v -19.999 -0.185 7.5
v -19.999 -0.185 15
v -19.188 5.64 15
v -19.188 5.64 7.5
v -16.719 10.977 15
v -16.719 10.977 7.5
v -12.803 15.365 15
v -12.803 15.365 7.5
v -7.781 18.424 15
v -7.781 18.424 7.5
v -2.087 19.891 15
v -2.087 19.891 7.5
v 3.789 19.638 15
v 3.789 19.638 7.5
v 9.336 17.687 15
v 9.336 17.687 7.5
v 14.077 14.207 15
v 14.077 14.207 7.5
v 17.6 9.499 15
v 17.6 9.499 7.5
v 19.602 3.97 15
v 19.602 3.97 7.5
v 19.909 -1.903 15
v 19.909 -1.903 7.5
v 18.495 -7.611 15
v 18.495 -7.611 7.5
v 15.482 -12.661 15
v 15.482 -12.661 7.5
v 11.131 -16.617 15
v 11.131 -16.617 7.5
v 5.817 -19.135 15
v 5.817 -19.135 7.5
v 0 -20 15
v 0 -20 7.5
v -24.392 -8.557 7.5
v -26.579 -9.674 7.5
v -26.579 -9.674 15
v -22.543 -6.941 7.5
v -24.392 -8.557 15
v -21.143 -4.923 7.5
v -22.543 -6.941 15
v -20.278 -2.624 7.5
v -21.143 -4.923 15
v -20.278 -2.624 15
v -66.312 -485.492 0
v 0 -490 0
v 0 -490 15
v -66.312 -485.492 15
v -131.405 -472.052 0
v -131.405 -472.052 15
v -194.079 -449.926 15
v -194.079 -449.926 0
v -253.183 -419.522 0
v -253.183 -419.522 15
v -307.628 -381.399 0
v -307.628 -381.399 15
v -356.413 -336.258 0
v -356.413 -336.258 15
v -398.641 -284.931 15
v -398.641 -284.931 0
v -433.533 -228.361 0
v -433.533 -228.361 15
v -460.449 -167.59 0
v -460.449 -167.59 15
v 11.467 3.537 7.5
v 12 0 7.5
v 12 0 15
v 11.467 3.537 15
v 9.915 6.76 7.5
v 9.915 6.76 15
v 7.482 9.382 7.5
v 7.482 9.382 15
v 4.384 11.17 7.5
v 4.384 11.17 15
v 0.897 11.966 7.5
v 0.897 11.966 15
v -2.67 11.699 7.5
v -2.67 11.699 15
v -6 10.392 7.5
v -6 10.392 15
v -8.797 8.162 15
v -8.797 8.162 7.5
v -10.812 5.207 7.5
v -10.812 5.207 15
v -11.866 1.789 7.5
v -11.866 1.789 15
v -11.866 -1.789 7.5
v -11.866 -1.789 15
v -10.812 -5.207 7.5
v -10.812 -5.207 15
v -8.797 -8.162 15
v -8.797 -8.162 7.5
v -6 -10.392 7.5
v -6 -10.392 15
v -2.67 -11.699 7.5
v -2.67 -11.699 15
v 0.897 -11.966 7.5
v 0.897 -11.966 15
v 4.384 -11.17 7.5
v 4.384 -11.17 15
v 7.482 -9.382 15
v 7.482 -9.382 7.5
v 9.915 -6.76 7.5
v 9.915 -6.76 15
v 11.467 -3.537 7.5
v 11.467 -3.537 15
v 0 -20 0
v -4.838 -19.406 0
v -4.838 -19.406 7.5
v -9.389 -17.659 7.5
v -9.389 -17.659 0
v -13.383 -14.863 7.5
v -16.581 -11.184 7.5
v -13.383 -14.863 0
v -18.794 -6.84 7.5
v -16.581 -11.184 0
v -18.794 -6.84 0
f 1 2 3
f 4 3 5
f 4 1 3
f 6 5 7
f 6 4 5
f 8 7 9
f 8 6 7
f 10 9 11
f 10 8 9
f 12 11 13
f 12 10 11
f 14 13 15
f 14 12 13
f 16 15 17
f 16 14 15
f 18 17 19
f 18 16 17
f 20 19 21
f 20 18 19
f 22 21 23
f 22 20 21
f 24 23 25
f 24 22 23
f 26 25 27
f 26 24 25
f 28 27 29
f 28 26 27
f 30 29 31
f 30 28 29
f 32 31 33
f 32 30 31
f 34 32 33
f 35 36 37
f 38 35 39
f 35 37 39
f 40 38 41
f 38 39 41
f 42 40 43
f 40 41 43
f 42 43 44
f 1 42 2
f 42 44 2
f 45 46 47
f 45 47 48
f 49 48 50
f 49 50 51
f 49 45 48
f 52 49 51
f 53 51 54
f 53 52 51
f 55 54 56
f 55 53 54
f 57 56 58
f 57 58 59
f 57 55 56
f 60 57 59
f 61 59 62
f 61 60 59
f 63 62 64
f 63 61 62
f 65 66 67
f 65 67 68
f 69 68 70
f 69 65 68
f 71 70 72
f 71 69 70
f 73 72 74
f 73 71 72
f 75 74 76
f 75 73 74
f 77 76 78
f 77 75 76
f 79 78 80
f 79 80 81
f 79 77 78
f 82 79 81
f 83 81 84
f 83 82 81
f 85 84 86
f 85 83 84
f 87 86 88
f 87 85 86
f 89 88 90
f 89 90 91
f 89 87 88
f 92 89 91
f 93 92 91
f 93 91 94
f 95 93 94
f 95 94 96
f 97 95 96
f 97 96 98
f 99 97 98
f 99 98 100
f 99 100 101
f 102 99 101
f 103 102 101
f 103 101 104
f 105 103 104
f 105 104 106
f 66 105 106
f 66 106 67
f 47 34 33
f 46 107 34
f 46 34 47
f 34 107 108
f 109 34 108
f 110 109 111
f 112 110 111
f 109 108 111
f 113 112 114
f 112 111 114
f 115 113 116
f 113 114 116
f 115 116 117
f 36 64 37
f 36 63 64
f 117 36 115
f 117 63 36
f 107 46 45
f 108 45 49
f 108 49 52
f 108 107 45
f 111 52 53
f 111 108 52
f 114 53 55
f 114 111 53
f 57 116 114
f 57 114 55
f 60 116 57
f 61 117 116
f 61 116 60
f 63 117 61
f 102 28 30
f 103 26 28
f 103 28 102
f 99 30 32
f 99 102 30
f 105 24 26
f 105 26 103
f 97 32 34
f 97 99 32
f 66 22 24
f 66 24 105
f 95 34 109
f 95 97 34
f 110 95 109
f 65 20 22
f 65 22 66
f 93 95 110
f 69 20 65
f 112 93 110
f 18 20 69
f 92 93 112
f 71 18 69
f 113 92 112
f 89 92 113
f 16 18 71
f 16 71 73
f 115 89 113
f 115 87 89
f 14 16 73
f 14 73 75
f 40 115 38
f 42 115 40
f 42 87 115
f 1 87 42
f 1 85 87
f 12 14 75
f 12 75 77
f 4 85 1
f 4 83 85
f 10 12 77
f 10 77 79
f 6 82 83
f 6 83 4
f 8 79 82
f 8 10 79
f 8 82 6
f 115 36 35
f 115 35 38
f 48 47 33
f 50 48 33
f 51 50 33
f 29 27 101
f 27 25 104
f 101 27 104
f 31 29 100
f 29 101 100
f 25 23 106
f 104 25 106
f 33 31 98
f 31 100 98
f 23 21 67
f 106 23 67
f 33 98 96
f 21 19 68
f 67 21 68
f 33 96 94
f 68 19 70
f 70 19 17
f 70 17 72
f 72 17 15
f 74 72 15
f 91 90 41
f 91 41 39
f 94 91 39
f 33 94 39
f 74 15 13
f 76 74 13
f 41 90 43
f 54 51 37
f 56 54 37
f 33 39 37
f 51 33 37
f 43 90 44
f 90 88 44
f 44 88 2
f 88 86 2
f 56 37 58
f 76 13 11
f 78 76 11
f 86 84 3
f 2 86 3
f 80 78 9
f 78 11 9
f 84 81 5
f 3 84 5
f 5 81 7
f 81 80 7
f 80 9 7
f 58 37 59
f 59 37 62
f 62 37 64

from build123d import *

# Parameters (mm, degrees)
SZKIC1_R                    = 12
DODANIE_WYCI_GNI_CIE1_DEPTH = 15
SZKIC2_R                    = 20
WYTNIJ_WYCI_GNI_CIE1_DEPTH  = 7.5
ZAOKR_GLENIE1_R             = 10


with BuildPart() as part:
    # Szkic1 → Dodanie-wyciągnięcie1 (new body)
    with BuildSketch(Plane.XY):
        with BuildLine():
            Line((0, -20), (0, -490))
            ThreePointArc((0, -490), (-281.052453812, -401.384501702), (-460.449384185, -167.58987023))
            Line((-460.449384185, -167.58987023), (-18.793852416, -6.840402867))
            ThreePointArc((-18.793852416, -6.840402867), (11.471528727, 16.383040886), (0, -20))
        make_face()
        Circle(SZKIC1_R, mode=Mode.SUBTRACT)
    extrude(amount=DODANIE_WYCI_GNI_CIE1_DEPTH)

    # Szkic2 → Wytnij-wyciągnięcie1 (cut)
    with BuildSketch(Plane(origin=(0, 0, 0), x_dir=(-1, 0, 0), z_dir=(0, 0, -1))):
        Circle(SZKIC2_R)
    extrude(amount=-WYTNIJ_WYCI_GNI_CIE1_DEPTH, mode=Mode.SUBTRACT)

    # Zaokrąglenie1
    zaokr_glenie1_edges = [part.edges().sort_by_distance(p)[0] for p in [
        (-18.793852416, -6.840402867, 11.25),
    ]]
    fillet(zaokr_glenie1_edges, radius=ZAOKR_GLENIE1_R)


solid = part.part
